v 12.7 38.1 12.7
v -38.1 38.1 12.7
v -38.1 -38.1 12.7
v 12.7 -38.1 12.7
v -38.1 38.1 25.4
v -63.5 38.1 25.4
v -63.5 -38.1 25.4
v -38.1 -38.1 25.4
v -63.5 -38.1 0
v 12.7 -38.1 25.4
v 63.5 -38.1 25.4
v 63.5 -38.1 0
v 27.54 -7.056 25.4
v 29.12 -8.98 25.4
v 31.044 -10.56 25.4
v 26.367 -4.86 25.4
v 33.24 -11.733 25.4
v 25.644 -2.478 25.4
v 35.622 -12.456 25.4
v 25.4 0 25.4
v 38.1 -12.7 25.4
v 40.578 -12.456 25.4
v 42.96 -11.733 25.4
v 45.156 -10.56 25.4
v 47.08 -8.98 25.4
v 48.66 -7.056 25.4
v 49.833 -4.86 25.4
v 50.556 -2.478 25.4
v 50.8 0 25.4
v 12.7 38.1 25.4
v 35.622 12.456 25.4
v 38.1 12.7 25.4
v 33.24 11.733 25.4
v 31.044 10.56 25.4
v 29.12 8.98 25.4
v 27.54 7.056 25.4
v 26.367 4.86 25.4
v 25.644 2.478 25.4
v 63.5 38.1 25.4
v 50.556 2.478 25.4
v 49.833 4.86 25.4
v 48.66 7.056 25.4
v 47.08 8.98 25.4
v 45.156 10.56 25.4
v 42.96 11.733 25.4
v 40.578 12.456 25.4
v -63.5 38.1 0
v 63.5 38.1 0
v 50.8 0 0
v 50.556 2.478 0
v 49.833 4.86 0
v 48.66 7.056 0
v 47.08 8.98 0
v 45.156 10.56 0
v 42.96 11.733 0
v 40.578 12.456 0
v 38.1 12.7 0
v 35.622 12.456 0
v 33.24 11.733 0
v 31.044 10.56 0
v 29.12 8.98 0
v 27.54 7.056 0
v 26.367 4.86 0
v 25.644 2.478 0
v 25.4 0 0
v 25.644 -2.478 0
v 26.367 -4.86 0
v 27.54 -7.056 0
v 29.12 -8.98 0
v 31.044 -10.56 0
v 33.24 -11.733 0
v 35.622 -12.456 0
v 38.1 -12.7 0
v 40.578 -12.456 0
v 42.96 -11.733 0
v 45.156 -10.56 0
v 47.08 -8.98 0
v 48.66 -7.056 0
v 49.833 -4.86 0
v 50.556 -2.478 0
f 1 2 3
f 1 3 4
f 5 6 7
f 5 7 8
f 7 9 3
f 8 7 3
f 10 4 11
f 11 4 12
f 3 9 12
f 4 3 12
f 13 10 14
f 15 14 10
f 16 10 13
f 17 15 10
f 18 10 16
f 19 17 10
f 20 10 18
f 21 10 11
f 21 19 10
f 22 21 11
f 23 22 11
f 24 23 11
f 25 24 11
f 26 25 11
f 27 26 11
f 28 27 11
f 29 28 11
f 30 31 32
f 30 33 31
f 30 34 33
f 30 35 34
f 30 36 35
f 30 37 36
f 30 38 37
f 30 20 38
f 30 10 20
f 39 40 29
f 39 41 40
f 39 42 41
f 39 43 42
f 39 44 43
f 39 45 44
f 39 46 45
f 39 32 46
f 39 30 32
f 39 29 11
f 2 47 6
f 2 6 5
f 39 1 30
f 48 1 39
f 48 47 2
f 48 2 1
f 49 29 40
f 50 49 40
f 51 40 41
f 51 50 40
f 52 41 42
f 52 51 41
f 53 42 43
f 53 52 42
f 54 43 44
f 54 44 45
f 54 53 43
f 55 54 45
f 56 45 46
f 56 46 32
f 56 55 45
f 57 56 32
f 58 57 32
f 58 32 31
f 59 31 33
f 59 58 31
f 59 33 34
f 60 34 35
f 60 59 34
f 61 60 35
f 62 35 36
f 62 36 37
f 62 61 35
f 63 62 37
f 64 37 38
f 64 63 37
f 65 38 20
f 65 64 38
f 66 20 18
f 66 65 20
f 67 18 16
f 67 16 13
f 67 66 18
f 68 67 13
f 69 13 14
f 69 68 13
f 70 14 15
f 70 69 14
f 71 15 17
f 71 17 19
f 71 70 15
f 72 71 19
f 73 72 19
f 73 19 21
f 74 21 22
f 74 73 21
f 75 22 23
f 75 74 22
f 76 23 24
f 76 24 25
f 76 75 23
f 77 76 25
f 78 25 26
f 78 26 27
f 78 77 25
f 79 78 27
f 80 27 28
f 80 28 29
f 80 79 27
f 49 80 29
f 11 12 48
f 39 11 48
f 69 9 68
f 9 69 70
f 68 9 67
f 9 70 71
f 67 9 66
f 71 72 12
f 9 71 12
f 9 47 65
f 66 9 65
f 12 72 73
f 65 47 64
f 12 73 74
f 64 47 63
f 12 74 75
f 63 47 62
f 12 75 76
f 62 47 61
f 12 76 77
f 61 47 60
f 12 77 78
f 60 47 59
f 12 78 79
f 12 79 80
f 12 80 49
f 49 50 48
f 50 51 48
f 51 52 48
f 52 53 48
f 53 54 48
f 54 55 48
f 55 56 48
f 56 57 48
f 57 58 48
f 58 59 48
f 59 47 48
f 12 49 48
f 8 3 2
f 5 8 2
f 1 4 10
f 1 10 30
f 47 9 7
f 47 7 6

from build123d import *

# Parameters (mm, degrees)
F0_W     = 25.4
F0_H     = 76.2
F1_DEPTH = 25.4
F0_W_2   = 50.8
F2_DEPTH = 12.7
F0_R     = 12.7
F3_DEPTH = 25.4


with BuildPart() as f1:
    # F0 (on Top) → F1 (new body)
    with BuildSketch(Plane.XY):
        with Locations((-50.8, 0)):
            Rectangle(F0_W, F0_H)
    extrude(amount=F1_DEPTH)

    # F0 (on Top) → F2 (join)
    with BuildSketch(Plane.XY):
        with Locations((-12.7, 0)):
            Rectangle(F0_W_2, F0_H)
    extrude(amount=F2_DEPTH)

    # F0 (on Top) → F3 (join)
    with BuildSketch(Plane.XY):
        with Locations((38.1, 0)):
            Rectangle(F0_W_2, F0_H)
        with Locations((38.1, 0)):
            Circle(F0_R, mode=Mode.SUBTRACT)
    extrude(amount=F3_DEPTH)


solid = f1.part
